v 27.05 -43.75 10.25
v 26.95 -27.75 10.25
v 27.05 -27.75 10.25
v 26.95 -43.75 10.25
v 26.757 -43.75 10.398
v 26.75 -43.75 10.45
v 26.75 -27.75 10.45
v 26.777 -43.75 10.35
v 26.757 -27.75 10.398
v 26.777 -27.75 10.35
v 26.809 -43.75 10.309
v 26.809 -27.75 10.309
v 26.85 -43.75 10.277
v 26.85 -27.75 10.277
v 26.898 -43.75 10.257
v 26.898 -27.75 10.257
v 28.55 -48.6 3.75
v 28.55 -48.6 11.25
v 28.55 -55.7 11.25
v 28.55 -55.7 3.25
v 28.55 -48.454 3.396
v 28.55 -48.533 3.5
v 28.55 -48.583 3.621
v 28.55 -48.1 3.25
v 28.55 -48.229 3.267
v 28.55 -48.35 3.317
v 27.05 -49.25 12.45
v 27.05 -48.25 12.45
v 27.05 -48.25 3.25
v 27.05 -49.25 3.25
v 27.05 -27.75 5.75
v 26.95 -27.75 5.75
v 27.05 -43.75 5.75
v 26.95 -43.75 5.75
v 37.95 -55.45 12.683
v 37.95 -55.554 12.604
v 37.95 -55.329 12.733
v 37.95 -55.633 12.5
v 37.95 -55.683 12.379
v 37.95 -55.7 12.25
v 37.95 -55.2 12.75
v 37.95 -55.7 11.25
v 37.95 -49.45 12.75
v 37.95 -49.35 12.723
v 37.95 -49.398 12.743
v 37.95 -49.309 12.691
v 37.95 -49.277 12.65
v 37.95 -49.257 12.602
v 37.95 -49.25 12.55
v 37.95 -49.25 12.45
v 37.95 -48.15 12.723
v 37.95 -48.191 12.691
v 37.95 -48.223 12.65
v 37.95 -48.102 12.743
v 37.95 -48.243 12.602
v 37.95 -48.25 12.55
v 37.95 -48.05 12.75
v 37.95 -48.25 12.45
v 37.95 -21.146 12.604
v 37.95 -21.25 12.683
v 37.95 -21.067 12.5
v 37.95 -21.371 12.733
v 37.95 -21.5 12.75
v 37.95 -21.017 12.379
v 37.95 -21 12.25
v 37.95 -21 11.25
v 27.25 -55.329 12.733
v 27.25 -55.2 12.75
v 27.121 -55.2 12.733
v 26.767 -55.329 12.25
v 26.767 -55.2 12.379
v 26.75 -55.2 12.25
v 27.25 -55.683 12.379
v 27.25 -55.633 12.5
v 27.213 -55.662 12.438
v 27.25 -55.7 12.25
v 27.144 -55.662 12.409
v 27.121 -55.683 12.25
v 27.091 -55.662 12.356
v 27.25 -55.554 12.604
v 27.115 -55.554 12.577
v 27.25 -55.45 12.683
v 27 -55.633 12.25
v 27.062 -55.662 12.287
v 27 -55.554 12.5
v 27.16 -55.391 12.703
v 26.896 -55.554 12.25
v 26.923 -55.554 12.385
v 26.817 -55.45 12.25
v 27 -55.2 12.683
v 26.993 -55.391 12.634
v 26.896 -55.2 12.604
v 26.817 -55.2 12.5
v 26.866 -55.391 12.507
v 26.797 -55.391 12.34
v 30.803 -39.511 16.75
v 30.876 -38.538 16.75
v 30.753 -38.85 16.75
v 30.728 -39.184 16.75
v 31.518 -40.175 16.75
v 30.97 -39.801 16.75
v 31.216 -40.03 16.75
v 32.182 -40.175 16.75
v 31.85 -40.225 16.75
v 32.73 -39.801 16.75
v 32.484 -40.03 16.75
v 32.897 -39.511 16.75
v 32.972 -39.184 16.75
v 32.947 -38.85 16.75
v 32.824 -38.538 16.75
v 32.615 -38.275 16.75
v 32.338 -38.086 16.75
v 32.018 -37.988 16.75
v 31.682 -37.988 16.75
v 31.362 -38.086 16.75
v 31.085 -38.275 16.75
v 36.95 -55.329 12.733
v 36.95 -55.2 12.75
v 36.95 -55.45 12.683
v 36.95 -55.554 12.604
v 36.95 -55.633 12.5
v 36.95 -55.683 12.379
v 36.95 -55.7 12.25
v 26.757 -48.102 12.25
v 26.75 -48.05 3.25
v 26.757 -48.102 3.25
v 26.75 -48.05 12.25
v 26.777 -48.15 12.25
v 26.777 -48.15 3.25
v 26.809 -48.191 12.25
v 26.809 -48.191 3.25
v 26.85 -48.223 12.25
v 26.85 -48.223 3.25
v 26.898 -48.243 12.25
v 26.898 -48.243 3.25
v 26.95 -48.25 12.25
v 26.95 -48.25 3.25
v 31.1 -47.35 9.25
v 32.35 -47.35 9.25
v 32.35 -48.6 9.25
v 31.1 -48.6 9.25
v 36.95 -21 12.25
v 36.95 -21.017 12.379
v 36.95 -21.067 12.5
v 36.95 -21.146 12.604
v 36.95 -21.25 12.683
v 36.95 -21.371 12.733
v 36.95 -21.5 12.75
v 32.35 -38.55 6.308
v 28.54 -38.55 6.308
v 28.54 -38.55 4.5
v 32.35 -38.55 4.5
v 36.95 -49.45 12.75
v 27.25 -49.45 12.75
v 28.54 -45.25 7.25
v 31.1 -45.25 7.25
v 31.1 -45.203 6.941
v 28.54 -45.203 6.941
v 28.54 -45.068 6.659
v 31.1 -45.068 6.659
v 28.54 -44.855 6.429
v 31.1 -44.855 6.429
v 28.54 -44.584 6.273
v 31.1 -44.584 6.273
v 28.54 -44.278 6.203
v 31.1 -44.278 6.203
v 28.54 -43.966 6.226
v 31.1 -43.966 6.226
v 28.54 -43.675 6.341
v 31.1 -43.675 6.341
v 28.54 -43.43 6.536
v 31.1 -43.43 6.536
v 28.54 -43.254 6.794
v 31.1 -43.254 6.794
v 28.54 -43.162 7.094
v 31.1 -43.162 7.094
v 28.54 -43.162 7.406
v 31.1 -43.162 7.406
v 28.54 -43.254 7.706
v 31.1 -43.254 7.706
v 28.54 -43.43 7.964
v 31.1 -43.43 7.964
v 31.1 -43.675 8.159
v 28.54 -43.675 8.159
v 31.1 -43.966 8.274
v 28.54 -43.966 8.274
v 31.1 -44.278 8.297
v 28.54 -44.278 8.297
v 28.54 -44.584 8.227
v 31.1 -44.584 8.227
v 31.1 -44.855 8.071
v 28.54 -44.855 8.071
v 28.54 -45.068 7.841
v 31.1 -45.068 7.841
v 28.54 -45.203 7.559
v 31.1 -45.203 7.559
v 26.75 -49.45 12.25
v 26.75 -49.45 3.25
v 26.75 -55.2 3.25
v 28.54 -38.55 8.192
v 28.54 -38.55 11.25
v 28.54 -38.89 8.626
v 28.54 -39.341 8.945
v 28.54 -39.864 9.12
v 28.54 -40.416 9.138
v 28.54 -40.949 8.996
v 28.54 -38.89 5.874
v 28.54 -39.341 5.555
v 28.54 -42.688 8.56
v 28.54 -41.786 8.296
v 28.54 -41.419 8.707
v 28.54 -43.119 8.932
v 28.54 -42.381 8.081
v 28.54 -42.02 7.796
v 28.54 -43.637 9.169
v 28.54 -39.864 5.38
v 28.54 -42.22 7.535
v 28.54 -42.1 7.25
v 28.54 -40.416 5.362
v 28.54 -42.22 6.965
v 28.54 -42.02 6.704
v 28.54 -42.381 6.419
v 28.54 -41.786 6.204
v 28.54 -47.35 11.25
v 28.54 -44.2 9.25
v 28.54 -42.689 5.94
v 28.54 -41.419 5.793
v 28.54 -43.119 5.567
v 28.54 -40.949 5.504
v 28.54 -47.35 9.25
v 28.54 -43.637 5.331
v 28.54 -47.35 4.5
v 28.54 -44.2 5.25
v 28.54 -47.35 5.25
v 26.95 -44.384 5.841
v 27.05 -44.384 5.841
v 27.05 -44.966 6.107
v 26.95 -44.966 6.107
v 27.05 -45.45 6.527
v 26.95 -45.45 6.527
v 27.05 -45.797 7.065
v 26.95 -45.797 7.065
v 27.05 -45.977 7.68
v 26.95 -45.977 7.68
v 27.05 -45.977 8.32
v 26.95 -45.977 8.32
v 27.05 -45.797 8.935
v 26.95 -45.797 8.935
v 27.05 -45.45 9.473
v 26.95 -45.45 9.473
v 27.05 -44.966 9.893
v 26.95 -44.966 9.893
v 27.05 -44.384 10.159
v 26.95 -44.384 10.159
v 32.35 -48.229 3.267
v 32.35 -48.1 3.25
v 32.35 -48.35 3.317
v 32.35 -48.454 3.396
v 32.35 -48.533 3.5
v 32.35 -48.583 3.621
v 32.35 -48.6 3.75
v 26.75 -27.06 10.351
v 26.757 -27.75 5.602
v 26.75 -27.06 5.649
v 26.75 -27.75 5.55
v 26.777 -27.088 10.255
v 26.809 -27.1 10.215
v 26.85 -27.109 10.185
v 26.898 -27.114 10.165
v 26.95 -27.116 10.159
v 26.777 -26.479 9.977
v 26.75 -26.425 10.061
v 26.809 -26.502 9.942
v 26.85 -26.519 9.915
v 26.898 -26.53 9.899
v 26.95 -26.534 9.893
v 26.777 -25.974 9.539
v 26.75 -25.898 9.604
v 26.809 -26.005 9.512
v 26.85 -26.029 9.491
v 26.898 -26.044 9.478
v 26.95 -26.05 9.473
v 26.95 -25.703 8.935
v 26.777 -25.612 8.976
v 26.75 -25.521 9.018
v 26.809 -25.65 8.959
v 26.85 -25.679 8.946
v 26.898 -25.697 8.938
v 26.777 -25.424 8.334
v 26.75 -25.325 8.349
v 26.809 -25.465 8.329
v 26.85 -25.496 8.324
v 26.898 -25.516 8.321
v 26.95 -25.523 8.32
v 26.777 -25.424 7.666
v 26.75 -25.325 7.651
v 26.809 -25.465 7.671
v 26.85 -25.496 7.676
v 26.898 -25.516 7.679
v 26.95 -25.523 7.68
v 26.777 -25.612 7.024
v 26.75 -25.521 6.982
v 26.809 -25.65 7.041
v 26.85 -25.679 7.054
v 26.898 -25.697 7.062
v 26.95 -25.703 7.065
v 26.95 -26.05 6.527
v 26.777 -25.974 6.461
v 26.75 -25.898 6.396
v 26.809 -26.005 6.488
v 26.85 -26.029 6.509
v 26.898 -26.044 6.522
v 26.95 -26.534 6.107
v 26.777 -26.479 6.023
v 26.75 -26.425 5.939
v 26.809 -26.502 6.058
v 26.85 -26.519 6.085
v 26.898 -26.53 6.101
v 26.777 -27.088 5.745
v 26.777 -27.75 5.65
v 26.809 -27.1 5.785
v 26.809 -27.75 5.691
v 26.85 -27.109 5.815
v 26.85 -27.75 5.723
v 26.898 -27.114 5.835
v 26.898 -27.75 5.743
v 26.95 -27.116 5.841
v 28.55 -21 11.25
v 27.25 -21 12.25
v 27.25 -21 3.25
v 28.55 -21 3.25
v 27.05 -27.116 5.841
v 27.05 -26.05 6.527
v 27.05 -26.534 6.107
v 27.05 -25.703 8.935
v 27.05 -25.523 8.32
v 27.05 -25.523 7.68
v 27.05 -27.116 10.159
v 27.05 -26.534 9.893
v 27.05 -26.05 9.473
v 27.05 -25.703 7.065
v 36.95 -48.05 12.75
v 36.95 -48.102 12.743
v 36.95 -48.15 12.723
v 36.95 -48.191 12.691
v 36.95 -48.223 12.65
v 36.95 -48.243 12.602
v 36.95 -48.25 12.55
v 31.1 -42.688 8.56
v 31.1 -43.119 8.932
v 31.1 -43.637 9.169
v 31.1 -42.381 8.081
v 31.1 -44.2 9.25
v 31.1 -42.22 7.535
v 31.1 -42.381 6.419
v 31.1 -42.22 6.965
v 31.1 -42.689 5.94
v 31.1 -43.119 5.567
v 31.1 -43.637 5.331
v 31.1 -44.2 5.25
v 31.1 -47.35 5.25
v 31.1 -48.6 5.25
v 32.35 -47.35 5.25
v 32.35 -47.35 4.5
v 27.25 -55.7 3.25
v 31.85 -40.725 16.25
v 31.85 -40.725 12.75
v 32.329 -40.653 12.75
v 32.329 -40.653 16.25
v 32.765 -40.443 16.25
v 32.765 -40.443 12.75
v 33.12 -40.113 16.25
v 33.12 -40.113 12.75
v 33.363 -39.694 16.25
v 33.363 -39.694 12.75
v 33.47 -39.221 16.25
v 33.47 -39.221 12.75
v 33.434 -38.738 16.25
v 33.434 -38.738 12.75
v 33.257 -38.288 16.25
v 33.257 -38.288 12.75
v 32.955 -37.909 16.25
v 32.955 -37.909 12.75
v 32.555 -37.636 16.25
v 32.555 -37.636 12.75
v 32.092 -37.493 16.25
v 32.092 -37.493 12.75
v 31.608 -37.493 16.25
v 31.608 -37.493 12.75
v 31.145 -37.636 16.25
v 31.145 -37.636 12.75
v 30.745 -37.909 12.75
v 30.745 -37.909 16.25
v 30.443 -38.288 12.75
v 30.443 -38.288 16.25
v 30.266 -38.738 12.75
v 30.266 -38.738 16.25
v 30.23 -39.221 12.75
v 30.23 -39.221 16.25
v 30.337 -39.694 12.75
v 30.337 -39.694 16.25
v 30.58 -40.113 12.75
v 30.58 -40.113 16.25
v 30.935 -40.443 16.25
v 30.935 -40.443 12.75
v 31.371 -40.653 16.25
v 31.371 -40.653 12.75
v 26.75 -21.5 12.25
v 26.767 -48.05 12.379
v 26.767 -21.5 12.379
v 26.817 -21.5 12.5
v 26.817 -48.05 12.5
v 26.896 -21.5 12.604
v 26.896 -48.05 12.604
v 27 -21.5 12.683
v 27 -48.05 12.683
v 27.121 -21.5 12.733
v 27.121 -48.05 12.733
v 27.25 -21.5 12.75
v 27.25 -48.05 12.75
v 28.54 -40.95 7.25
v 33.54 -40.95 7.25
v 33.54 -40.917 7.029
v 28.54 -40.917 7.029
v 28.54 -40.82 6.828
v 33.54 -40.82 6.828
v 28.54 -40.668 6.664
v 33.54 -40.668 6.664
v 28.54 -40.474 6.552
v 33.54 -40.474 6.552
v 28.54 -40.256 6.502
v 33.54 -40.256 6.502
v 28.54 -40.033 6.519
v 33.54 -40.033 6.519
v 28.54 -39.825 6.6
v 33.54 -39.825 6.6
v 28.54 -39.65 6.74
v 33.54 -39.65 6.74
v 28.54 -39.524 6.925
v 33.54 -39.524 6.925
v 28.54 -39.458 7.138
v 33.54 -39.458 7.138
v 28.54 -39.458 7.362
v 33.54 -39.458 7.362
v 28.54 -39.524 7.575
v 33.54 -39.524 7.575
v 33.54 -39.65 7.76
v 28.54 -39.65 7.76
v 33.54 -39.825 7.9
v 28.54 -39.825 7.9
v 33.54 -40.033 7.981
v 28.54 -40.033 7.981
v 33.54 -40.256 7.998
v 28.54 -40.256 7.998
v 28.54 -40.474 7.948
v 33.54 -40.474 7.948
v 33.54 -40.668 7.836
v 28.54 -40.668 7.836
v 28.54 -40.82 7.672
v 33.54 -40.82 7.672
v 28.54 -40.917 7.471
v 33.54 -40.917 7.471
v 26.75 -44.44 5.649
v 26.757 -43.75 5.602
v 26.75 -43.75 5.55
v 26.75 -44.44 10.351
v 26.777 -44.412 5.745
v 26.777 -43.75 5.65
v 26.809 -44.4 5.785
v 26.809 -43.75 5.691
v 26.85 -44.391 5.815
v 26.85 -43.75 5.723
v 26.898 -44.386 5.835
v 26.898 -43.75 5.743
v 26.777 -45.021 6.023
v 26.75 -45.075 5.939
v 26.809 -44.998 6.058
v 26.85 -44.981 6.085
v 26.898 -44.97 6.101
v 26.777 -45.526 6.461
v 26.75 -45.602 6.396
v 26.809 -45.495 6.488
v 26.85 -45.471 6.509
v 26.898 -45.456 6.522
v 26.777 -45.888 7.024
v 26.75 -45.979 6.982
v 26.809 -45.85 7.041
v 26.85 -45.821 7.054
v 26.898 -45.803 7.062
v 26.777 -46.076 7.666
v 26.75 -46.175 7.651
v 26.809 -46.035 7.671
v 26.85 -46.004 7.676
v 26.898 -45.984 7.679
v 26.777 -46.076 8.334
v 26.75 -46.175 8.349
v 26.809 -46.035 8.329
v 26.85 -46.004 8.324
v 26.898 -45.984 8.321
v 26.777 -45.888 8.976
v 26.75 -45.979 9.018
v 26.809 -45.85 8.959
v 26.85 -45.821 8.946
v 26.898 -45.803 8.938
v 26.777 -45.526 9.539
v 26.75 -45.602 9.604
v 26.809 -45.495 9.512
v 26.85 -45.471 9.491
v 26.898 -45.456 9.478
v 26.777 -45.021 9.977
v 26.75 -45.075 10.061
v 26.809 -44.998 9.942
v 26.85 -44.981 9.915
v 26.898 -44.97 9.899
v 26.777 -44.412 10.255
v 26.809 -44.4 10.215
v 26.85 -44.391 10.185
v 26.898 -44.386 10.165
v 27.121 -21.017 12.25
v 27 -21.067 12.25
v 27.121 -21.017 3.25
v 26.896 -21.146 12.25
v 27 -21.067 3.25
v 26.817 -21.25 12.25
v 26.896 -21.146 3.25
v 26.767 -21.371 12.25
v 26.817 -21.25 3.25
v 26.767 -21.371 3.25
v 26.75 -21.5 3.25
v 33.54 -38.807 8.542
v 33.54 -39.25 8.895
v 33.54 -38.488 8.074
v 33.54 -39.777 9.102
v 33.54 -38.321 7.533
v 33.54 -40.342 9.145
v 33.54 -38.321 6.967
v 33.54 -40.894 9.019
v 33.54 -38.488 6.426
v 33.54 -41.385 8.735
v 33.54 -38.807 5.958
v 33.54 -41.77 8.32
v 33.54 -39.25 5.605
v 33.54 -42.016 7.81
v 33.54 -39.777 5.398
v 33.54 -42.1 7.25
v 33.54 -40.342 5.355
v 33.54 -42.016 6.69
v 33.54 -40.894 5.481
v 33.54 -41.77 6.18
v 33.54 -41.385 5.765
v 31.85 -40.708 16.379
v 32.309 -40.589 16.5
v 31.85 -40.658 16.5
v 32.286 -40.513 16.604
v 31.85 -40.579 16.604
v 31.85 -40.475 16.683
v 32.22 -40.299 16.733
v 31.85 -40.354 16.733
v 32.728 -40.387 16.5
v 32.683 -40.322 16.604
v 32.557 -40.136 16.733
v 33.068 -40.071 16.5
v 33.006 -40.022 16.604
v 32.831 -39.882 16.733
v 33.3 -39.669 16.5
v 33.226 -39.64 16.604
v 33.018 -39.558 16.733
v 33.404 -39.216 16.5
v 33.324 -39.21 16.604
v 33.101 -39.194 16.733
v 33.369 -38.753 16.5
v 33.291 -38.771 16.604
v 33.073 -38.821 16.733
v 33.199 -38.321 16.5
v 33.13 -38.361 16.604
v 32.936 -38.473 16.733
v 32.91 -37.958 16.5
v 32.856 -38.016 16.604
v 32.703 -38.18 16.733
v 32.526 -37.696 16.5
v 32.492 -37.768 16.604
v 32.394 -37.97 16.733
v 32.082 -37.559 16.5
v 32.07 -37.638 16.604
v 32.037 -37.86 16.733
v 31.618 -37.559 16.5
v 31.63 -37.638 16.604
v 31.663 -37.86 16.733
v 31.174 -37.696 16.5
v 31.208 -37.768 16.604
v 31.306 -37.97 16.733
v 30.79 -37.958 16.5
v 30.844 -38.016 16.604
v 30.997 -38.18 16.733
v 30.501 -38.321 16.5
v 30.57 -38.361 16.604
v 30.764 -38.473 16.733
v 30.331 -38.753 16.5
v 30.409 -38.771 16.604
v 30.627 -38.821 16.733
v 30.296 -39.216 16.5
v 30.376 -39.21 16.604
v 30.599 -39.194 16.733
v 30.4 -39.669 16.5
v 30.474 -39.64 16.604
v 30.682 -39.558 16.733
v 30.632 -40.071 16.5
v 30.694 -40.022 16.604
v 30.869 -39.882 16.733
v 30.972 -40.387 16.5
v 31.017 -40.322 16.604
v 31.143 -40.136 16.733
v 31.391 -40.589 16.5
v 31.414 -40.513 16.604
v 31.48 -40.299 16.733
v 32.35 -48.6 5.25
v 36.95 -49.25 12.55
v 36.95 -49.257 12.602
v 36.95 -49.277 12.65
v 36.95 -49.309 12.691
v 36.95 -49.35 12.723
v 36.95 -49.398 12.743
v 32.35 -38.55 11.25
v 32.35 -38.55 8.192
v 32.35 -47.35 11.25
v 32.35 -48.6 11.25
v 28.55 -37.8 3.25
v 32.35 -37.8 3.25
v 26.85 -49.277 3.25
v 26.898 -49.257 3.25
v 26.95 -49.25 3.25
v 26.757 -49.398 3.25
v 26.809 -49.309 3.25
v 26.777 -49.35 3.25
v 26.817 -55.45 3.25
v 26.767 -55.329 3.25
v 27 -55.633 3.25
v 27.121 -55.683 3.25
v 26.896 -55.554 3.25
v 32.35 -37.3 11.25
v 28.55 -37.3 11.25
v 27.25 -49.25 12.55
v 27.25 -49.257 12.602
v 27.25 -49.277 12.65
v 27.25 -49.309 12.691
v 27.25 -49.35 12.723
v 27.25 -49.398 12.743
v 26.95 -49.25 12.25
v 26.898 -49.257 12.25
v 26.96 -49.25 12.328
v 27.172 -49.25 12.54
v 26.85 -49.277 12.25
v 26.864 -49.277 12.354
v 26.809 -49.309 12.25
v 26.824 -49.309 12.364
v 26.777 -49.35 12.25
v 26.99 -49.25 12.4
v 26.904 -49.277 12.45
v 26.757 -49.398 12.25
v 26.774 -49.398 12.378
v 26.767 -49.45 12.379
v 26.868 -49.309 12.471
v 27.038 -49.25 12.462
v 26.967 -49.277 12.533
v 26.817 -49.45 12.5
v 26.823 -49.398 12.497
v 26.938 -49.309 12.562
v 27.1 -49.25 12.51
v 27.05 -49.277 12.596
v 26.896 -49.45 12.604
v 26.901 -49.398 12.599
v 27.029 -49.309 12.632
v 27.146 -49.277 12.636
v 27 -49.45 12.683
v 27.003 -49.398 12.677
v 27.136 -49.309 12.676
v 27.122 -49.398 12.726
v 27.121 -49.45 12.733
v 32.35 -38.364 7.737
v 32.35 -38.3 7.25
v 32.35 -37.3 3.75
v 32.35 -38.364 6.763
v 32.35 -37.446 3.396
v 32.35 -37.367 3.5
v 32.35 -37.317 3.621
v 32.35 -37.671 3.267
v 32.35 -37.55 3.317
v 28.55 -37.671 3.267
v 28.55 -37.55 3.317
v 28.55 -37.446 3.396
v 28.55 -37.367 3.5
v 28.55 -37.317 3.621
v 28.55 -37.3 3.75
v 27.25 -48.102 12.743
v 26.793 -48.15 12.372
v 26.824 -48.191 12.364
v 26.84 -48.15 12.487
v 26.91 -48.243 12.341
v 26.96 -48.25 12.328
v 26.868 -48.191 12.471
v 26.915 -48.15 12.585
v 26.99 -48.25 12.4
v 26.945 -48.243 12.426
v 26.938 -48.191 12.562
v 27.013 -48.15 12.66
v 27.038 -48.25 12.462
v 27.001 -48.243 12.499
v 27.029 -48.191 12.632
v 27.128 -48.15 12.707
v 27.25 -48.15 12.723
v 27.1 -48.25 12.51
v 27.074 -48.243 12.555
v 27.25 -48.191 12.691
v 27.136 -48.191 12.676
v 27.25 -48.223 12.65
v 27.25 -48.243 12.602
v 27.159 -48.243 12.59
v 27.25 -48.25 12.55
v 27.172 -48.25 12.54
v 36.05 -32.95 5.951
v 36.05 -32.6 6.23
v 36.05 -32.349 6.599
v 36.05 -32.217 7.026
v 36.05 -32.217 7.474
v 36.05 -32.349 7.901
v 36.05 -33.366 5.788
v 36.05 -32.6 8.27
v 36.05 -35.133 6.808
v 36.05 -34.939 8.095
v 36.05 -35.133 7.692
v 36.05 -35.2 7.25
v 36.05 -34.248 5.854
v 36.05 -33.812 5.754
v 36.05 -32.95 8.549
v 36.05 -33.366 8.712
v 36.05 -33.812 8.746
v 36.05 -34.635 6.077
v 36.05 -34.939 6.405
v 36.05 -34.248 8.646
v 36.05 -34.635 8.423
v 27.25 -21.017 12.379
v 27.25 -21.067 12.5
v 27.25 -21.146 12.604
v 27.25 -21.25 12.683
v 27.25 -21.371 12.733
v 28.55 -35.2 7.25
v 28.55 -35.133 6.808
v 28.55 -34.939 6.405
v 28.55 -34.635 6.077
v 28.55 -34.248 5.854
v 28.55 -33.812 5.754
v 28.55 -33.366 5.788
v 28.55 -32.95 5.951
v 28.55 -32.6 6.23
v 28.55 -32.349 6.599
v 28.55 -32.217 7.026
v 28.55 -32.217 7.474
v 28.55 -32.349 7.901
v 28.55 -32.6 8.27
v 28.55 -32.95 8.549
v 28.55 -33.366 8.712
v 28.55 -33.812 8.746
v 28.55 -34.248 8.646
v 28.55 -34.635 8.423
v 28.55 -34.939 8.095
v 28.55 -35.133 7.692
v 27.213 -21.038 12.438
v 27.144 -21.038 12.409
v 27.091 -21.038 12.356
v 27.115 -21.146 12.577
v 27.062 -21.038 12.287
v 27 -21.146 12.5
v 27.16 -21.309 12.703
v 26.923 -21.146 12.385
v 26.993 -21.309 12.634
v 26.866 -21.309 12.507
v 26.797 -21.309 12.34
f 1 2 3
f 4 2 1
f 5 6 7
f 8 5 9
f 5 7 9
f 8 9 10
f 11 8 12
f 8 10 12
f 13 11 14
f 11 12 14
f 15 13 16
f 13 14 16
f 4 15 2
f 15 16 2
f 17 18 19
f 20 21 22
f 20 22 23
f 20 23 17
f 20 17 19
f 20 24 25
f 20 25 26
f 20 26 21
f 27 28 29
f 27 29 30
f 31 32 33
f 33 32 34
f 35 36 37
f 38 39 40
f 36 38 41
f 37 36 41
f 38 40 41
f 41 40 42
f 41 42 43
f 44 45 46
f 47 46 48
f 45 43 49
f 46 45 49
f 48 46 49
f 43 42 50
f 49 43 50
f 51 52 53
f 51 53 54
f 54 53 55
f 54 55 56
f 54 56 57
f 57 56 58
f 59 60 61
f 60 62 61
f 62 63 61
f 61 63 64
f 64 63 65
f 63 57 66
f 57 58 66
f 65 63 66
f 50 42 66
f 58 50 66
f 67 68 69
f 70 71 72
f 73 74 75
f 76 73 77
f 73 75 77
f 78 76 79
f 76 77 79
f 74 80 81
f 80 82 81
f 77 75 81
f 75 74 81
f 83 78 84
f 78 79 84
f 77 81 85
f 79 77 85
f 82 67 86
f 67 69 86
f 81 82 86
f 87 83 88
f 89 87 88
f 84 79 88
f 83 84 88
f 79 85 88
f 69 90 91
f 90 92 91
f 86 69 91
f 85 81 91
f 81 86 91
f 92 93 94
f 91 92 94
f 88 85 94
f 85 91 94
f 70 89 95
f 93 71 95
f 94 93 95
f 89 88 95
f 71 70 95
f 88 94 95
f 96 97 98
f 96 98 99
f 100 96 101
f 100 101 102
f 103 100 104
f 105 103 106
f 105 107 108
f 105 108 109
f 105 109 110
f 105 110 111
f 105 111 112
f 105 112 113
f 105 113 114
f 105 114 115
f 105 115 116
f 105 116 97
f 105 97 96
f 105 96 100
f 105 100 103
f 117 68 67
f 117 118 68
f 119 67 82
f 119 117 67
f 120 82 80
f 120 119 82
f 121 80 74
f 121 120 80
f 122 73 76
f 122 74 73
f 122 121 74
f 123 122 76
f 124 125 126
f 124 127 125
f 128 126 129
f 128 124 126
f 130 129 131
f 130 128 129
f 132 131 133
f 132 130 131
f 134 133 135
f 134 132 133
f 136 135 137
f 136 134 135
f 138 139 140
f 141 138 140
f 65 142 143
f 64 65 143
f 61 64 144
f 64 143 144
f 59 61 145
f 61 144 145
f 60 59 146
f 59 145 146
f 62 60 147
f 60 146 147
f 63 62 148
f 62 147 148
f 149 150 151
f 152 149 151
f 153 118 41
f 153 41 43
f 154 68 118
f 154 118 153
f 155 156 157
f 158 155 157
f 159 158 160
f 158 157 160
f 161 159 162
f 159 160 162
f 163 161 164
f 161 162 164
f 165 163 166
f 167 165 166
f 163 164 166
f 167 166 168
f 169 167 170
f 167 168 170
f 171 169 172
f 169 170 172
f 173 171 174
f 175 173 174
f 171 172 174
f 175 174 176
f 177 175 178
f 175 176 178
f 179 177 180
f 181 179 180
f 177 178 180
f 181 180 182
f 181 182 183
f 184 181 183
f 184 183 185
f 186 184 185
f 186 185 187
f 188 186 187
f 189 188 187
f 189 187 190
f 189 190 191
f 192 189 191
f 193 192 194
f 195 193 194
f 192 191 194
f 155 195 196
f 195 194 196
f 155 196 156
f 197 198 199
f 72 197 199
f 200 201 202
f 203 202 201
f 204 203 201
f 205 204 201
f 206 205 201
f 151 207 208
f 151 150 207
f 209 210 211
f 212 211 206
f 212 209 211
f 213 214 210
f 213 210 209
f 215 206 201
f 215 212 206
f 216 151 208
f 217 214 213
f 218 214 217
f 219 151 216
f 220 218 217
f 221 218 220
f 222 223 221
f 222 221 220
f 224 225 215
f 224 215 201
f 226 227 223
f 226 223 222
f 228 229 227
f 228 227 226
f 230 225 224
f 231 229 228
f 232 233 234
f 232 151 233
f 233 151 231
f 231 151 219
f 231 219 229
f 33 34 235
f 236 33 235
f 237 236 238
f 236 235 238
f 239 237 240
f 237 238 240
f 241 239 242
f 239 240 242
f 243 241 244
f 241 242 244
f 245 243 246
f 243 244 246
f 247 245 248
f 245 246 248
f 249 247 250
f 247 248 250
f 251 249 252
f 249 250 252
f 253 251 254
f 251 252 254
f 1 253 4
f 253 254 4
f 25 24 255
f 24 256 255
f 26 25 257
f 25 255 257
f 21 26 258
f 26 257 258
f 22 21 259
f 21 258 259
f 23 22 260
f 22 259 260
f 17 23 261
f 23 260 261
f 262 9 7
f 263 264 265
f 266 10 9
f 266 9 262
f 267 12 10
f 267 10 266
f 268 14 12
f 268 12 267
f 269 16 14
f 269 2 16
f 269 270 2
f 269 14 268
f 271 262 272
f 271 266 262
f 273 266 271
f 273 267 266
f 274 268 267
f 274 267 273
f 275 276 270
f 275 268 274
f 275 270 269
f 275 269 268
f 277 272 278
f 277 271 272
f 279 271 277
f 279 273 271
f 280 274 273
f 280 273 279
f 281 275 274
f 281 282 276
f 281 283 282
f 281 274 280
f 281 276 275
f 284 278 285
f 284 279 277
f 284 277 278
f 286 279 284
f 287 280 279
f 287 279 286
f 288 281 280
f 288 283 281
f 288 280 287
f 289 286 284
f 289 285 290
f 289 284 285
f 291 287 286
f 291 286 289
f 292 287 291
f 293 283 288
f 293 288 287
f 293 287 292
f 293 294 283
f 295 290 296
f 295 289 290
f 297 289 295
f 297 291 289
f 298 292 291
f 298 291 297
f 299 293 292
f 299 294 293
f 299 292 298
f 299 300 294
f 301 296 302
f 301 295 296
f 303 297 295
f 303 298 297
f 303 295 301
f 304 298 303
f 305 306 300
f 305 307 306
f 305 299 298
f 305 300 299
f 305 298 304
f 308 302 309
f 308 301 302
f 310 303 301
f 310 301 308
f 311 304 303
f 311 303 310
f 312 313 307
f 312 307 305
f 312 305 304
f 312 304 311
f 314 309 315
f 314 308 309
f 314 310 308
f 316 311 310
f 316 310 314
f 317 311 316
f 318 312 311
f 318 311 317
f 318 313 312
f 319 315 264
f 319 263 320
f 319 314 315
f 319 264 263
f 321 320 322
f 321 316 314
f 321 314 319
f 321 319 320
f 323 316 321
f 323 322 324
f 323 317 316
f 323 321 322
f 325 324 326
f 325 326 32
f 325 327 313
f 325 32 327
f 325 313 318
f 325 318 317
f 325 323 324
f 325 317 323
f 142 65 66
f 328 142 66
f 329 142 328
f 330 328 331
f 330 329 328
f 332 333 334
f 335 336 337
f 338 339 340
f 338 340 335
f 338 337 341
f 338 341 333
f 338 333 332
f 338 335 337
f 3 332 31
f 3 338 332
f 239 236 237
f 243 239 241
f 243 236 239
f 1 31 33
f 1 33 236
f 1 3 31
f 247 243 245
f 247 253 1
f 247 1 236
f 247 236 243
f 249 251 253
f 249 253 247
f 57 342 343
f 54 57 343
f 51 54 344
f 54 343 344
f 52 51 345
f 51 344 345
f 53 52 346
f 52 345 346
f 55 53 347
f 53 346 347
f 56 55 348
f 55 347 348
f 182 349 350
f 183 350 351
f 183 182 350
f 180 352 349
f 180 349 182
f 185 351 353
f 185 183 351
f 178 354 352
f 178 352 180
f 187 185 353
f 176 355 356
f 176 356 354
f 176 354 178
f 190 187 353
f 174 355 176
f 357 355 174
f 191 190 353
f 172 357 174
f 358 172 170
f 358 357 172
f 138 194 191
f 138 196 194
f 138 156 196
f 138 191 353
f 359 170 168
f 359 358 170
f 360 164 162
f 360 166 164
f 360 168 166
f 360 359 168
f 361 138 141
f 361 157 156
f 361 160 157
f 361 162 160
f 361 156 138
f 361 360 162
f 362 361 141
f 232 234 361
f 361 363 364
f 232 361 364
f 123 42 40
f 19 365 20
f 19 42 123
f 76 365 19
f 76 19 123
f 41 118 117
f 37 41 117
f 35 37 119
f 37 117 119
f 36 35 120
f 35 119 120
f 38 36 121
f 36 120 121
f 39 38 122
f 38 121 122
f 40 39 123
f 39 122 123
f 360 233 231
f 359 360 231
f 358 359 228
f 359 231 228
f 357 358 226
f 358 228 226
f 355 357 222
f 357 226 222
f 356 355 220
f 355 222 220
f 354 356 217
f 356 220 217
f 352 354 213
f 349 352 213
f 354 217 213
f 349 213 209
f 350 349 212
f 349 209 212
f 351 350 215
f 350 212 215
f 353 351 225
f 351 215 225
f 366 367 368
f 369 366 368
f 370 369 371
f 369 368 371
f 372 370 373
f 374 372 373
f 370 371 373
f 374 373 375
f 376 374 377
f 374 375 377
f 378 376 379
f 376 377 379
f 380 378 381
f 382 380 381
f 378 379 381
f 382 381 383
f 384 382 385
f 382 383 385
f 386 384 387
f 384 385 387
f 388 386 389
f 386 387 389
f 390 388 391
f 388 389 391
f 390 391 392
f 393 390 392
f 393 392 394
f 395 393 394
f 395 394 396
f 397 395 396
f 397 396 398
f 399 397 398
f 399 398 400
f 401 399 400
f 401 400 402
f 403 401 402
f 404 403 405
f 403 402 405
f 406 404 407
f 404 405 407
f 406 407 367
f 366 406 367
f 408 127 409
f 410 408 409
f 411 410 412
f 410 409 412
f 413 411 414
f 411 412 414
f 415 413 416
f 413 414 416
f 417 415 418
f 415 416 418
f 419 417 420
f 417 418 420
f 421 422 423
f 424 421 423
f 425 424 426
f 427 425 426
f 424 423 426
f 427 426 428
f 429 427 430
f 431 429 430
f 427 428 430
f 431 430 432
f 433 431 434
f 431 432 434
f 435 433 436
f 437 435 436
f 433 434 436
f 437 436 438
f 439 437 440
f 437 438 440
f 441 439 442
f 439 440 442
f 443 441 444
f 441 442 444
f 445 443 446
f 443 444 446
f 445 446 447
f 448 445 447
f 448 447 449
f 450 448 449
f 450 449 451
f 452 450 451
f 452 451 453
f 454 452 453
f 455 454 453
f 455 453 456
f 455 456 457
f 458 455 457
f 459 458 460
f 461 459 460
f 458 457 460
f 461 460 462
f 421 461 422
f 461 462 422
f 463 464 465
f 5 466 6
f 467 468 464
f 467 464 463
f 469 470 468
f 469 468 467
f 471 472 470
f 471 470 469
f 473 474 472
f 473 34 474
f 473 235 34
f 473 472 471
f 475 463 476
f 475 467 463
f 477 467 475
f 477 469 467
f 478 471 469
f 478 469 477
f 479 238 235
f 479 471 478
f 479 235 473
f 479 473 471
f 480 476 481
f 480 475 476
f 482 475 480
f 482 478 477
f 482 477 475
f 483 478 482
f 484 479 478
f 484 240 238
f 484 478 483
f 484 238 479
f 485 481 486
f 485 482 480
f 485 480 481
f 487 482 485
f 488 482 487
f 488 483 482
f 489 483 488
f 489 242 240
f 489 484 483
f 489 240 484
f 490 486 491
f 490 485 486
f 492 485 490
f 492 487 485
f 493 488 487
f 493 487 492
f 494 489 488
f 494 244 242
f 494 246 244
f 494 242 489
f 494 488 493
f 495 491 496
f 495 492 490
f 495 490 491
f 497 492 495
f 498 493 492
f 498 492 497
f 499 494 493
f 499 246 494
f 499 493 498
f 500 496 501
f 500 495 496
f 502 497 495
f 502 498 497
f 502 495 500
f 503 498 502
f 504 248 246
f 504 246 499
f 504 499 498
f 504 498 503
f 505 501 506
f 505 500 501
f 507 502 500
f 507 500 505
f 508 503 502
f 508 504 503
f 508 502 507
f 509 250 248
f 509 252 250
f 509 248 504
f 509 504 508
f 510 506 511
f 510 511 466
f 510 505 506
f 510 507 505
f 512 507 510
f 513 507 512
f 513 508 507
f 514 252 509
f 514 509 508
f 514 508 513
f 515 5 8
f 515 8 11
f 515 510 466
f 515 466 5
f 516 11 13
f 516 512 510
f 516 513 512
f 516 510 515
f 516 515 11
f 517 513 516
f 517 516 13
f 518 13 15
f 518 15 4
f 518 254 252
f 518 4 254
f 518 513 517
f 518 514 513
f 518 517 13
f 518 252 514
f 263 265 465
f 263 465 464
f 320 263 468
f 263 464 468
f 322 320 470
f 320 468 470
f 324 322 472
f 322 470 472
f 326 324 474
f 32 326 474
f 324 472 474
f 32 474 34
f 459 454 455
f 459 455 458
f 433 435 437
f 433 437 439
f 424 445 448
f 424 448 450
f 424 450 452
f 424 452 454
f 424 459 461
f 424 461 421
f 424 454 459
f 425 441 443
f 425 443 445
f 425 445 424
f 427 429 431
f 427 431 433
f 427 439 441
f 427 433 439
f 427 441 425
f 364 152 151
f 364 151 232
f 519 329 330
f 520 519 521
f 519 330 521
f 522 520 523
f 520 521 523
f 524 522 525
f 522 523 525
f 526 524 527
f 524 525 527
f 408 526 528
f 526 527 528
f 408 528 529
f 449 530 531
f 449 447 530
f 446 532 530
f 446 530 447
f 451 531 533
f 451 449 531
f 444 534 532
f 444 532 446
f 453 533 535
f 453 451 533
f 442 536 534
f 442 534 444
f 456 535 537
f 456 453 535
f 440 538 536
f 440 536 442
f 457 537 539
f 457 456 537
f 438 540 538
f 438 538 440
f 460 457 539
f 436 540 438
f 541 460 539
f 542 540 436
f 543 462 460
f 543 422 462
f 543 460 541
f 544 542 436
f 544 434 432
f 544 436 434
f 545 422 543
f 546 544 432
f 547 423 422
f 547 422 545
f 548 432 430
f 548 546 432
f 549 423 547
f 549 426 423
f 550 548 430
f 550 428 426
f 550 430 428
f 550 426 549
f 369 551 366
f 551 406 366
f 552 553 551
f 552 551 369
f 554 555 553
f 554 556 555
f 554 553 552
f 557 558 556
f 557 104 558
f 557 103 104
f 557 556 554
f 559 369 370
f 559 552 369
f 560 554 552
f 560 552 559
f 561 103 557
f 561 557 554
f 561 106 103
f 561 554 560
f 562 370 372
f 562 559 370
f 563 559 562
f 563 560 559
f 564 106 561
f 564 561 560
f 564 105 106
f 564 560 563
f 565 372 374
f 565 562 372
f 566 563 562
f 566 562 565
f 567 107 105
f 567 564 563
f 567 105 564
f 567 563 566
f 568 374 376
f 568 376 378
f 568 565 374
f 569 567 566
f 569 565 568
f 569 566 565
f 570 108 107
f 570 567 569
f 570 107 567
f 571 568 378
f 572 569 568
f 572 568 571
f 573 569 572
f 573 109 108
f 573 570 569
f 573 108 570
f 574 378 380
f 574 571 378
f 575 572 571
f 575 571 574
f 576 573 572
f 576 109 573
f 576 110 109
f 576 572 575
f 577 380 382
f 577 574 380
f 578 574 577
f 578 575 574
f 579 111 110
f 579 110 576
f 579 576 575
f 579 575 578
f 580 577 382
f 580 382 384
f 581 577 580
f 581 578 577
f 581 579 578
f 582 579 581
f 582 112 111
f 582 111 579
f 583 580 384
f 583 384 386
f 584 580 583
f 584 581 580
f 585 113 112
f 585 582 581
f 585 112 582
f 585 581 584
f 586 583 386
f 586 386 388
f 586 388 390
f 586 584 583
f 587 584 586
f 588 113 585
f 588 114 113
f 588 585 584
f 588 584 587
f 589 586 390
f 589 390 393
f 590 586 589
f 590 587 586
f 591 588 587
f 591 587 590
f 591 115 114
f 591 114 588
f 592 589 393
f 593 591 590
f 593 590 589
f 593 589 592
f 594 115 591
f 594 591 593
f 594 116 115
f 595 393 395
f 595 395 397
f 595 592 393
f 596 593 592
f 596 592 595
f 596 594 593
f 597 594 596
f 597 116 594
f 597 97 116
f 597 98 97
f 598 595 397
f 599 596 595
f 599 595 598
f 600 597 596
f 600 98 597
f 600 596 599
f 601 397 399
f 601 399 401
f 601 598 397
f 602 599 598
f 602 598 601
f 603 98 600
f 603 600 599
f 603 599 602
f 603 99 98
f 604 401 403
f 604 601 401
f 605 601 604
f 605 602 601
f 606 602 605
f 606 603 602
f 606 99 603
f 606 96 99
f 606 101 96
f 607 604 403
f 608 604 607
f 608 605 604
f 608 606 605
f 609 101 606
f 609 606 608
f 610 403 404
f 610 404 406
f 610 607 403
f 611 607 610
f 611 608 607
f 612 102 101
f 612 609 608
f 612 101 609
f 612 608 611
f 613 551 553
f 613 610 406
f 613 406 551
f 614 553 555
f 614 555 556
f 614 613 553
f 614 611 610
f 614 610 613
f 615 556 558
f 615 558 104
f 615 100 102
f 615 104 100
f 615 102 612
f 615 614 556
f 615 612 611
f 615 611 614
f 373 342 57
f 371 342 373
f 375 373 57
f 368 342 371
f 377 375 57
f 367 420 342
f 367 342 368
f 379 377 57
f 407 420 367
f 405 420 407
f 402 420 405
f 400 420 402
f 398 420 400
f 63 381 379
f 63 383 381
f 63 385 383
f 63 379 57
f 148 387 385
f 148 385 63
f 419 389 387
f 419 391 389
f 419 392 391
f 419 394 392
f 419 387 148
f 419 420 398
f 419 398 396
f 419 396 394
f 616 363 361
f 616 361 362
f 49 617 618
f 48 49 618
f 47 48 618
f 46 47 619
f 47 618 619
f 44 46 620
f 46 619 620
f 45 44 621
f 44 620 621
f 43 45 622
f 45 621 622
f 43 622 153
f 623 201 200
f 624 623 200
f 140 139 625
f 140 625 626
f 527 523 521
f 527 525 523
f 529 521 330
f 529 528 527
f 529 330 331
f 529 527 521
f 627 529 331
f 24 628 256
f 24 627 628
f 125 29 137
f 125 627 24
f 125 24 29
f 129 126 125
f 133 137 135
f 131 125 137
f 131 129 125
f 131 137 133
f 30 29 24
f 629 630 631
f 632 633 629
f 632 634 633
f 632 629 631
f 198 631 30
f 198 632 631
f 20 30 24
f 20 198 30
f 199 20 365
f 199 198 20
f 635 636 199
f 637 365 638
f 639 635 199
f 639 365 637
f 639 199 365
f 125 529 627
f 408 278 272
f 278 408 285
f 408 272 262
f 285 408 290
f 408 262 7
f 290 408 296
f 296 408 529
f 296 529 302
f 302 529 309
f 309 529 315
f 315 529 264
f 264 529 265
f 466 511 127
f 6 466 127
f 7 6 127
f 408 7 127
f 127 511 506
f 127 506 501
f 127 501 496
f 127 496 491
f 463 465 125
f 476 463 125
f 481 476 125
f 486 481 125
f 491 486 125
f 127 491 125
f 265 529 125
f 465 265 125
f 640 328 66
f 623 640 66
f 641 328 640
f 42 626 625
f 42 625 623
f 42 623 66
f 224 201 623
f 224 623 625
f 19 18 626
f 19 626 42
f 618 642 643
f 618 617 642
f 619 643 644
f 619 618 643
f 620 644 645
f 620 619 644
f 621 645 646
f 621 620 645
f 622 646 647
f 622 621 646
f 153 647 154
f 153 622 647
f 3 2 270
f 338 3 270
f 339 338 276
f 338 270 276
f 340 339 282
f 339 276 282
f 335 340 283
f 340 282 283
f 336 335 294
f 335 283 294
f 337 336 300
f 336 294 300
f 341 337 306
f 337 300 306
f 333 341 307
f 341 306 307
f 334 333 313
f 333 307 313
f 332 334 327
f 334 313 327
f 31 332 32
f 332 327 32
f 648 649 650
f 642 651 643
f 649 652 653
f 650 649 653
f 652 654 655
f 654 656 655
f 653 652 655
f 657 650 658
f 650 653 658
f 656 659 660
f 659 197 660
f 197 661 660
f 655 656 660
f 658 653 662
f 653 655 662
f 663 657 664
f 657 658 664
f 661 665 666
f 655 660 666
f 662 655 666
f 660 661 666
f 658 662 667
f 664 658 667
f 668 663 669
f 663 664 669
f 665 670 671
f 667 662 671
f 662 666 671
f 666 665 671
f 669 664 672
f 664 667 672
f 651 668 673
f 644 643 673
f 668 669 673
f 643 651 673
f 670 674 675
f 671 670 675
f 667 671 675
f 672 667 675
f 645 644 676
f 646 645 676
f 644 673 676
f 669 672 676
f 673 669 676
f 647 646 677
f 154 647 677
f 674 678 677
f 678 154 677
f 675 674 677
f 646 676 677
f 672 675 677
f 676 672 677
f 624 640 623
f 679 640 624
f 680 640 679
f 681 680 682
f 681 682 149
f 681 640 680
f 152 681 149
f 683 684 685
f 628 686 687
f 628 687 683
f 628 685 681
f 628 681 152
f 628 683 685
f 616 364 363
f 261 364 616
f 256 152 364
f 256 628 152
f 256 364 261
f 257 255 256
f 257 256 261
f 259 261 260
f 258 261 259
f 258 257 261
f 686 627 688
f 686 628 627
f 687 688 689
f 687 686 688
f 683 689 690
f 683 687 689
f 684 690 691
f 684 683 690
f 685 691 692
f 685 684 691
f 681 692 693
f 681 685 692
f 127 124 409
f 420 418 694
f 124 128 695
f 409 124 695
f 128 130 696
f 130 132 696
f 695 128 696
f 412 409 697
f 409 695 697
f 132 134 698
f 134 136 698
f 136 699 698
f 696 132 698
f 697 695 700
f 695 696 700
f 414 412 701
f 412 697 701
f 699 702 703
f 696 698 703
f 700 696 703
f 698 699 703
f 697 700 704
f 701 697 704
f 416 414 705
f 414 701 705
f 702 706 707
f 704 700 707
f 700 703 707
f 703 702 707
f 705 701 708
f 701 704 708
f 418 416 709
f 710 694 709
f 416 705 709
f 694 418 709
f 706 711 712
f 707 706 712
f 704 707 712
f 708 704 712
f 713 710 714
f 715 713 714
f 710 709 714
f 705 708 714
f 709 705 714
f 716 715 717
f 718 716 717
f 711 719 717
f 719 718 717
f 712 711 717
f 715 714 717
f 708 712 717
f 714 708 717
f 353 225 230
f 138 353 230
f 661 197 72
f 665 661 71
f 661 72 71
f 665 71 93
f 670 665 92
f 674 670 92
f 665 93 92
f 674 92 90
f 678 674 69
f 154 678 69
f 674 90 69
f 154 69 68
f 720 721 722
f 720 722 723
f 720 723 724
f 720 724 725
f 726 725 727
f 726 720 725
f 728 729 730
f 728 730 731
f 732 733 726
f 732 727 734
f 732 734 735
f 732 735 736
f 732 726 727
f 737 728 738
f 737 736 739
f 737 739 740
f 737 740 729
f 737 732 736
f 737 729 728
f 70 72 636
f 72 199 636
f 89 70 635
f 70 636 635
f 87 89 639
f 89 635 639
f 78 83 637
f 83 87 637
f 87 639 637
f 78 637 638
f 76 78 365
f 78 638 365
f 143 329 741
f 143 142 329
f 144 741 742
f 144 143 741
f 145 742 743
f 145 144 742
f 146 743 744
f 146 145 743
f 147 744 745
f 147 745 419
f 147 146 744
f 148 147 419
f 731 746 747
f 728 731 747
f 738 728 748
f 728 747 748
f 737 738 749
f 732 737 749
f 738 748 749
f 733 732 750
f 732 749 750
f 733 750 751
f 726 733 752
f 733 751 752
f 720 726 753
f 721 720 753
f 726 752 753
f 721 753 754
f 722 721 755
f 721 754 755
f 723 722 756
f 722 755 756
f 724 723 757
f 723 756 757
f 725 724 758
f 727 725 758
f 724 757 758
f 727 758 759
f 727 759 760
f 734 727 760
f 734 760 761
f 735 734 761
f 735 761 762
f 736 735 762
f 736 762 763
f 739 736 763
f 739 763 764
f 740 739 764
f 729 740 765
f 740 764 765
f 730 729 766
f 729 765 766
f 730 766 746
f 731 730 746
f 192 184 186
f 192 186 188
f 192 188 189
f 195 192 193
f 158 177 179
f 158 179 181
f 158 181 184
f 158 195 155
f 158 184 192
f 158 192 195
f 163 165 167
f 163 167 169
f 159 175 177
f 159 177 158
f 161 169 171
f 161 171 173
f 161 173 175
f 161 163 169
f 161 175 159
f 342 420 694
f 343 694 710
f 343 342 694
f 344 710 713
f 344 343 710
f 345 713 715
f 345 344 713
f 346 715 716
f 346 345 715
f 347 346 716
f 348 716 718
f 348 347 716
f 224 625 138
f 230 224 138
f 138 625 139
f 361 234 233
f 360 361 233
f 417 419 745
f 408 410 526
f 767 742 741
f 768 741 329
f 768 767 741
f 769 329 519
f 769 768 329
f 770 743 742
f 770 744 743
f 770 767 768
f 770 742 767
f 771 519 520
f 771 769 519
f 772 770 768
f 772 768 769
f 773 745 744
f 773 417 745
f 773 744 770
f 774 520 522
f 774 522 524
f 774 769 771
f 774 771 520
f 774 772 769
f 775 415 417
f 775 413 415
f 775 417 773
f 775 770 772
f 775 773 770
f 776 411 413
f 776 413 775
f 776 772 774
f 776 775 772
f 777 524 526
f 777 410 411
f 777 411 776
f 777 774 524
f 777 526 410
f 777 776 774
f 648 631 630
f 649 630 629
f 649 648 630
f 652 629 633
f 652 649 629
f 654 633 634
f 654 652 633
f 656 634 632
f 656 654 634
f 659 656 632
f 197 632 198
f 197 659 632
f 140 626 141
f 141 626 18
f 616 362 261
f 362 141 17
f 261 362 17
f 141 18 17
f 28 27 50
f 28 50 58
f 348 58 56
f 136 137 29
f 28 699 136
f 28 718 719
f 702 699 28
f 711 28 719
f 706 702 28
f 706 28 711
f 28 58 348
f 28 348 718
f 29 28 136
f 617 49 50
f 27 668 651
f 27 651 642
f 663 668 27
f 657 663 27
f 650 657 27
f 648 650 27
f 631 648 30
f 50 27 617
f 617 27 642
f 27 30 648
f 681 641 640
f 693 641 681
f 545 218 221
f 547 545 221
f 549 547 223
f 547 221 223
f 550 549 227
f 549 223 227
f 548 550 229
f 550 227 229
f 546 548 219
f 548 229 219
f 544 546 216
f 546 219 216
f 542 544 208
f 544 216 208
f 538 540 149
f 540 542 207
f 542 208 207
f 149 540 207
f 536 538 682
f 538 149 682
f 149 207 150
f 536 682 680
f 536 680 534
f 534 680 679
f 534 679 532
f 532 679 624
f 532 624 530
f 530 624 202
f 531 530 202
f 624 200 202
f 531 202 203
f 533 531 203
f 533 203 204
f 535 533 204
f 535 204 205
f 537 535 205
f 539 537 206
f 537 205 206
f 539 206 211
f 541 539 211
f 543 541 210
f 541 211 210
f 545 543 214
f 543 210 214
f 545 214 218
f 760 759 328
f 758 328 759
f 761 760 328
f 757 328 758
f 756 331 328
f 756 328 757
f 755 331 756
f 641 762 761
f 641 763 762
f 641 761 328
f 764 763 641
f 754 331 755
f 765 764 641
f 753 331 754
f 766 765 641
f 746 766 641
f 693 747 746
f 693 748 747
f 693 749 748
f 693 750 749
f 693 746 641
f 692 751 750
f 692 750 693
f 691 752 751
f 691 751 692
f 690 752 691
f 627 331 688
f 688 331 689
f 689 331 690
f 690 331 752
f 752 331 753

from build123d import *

# Parameters (mm, degrees)
SKETCH012_W             = 34.7
SKETCH012_H             = 9.5
PAD002_DEPTH            = 10.2
SKETCH013_W             = 34.7
SKETCH013_H             = 8
POCKET010_DEPTH         = 8.4
SKETCH014_W             = 11.3
SKETCH014_H             = 8
PAD003_DEPTH            = 3.8
SKETCH015_R             = 1.5
PAD004_DEPTH            = 7.5
FILLET002_R             = 0.5
SKETCH016_W             = 8.8
SKETCH016_H             = 6.75
POCKET011_DEPTH         = 3.81
SKETCH018_W             = 1.25
SKETCH018_H             = 4
POCKET012_DEPTH         = 1.25
PAD005_DEPTH            = 2.56
SKETCH019_R             = 1.9
PAD006_DEPTH            = 5
SKETCH020_R             = 1.05
POCKET014_DEPTH         = 2.56
SKETCH021_R             = 0.75
POCKET015_DEPTH         = 5
SKETCH022_W             = 1
SKETCH022_H             = 9.5
POCKET016_DEPTH         = 0.3
SKETCH023_W             = 1
SKETCH023_H             = 10.2
POCKET017_DEPTH         = 0.3
FILLET003_R             = 0.2
FILLET004_R             = 0.2
SKETCH036_R             = 1.625
PAD012_DEPTH            = 4
FILLET008_R             = 0.5
FILLET020_R             = 0.5
PAD161_DEPTH            = 1
BODY002_ROLL_ANGLE      = -90
BODY002_PLACEMENT_ANGLE = -90


with BuildPart() as part:
    # Sketch012 → Pad002 (new body)
    with BuildSketch(Plane.XY):
        with Locations((-17.35, 0)):
            Rectangle(SKETCH012_W, SKETCH012_H)
    extrude(amount=PAD002_DEPTH)

    # Sketch013 (on Face6 of Pad002) → Pocket010 (cut)
    with BuildSketch(Plane.XY.offset(10.2)):
        with Locations((-17.35, 0.75)):
            Rectangle(SKETCH013_W, SKETCH013_H)
    extrude(amount=-POCKET010_DEPTH, mode=Mode.SUBTRACT)

    # Sketch014 (on Face6 of Pocket010) → Pad003 (join)
    with BuildSketch(Plane.XY.offset(1.8)):
        with Locations((-12.75, 0.75)):
            Rectangle(SKETCH014_W, SKETCH014_H)
    extrude(amount=PAD003_DEPTH)

    # Sketch015 (on Face6 of Pad003) → Pad004 (join)
    with BuildSketch(Plane.XY.offset(1.8)):
        with Locations((-22, 0.75)):
            Circle(SKETCH015_R)
    extrude(amount=PAD004_DEPTH)

    # Fillet002
    fillet002_edges = [part.edges().sort_by_distance(p)[0] for p in [
        (-17.35, -4.75, 0),
        (-34.7, -4.75, 5.1),
        (-34.7, 0, 0),
        (0, -4.75, 5.1),
        (0, 0, 0),
    ]]
    fillet(fillet002_edges, radius=FILLET002_R)

    # Sketch016 (on Face14 of Fillet002) → Pocket011 (cut)
    with BuildSketch(Plane.XY.offset(5.6)):
        with Locations((-12.75, 0.125)):
            Rectangle(SKETCH016_W, SKETCH016_H)
    extrude(amount=-POCKET011_DEPTH, mode=Mode.SUBTRACT)

    # Sketch018 (on Face13 of Pocket011) → Pocket012 (cut)
    with BuildSketch(Plane.XY.offset(5.6)):
        with Locations((-7.725, 0.75)):
            Rectangle(SKETCH018_W, SKETCH018_H)
    extrude(amount=-POCKET012_DEPTH, mode=Mode.SUBTRACT)

    # Sketch017 (on Face23 of Pocket011) → Pad005 (join)
    with BuildSketch(Plane.XY.offset(1.79)):
        with BuildLine():
            Line((-8.35, 2.75), (-11.5, 2.75))
            ThreePointArc((-11.5, 2.75), (-13.500002, 0.750015), (-11.500029, -1.25))
            Line((-11.500029, -1.25), (-8.35, -1.25))
            Line((-8.35, -1.25), (-8.35, 2.75))
        make_face()
    extrude(amount=PAD005_DEPTH)

    # Sketch019 (on Face16 of Pad005) → Pad006 (join)
    with BuildSketch(Plane.XY.offset(1.79)):
        with Locations((-15.5, 0.75)):
            Circle(SKETCH019_R)
    extrude(amount=PAD006_DEPTH)

    # Sketch020 (on Face26 of Pad006) → Pocket014 (cut)
    with BuildSketch(Plane.XY.offset(4.35)):
        with Locations((-11.5, 0.75)):
            Circle(SKETCH020_R)
    extrude(amount=-POCKET014_DEPTH, mode=Mode.SUBTRACT)

    # Sketch021 (on Face37 of Pocket014) → Pocket015 (cut)
    with BuildSketch(Plane.XY.offset(6.79)):
        with Locations((-15.5, 0.75)):
            Circle(SKETCH021_R)
    extrude(amount=-POCKET015_DEPTH, mode=Mode.SUBTRACT)

    # Sketch022 (on Face20 of Pocket015) → Pocket016 (cut)
    with BuildSketch(Plane(origin=(0, 0, 0), x_dir=(1, 0, 0), z_dir=(0, 0, -1))):
        with BuildLine():
            ThreePointArc((-27.95, 2.25), (-30.2, 0), (-27.95, -2.25))
            Line((-27.95, -2.25), (-11.95, -2.25))
            ThreePointArc((-11.95, -2.25), (-9.7, 0), (-11.95, 2.25))
            Line((-27.95, 2.25), (-11.95, 2.25))
        make_face()
        with Locations((-6.95, 0)):
            Rectangle(SKETCH022_W, SKETCH022_H)
    extrude(amount=-POCKET016_DEPTH, mode=Mode.SUBTRACT)

    # Sketch023 (on Face10 of Pocket016) → Pocket017 (cut)
    with BuildSketch(Plane.XZ.offset(4.75)):
        with Locations((-6.95, 5.1)):
            Rectangle(SKETCH023_W, SKETCH023_H)
    extrude(amount=-POCKET017_DEPTH, mode=Mode.SUBTRACT)

    # Fillet003
    fillet003_edges = [part.edges().sort_by_distance(p)[0] for p in [
        (-9.7, 0, 0),
        (-19.95, 2.25, 0),
        (-19.95, -2.25, 0),
        (-30.2, 0, 0),
    ]]
    fillet(fillet003_edges, radius=FILLET003_R)

    # Fillet004
    fillet004_edges = [part.edges().sort_by_distance(p)[0] for p in [
        (-7.45, 0.25, 0),
        (-6.45, 0.25, 0),
        (-7.45, -4.352155, 0.010547),
        (-7.45, -4.603553, 0.146447),
        (-7.45, -4.739453, 0.397845),
        (-7.45, -4.75, 5.35),
        (-6.45, -4.75, 5.35),
        (-6.45, -4.739453, 0.397845),
        (-6.45, -4.603553, 0.146447),
        (-6.45, -4.352155, 0.010547),
    ]]
    fillet(fillet004_edges, radius=FILLET004_R)

    # Sketch036 (on Face13 of Fillet004) → Pad012 (join)
    with BuildSketch(Plane.XZ.offset(4.75)):
        with Locations((-16.6, 5.1)):
            Circle(SKETCH036_R)
    extrude(amount=PAD012_DEPTH)

    # Fillet008
    fillet008_edges = [part.edges().sort_by_distance(p)[0] for p in [
        (-18.225, -8.75, 5.1),
    ]]
    fillet(fillet008_edges, radius=FILLET008_R)

    # Fillet020
    fillet020_edges = [part.edges().sort_by_distance(p)[0] for p in [
        (-7.1, 4.75, 3.7),
        (-18.4, 4.75, 3.7),
    ]]
    fillet(fillet020_edges, radius=FILLET020_R)

    # Sketch282 (on Face29 of Fillet020) → Pad161 (join)
    with BuildSketch(Plane.XY.offset(10.2)):
        with BuildLine():
            Line((0, -3.25), (0, -4.25))
            ThreePointArc((-0.5, -4.75), (-0.146447, -4.603553), (0, -4.25))
            Line((-0.5, -4.75), (-6.25, -4.75))
            ThreePointArc((-6.45, -4.55), (-6.391421, -4.691421), (-6.25, -4.75))
            Line((-6.45, -4.55), (-6.45, -4.45))
            Line((-6.45, -4.45), (-7.45, -4.45))
            Line((-7.45, -4.45), (-7.45, -4.55))
            ThreePointArc((-7.65, -4.75), (-7.508579, -4.691421), (-7.45, -4.55))
            Line((-7.65, -4.75), (-34.2, -4.75))
            ThreePointArc((-34.7, -4.25), (-34.553553, -4.603553), (-34.2, -4.75))
            Line((-34.7, -4.25), (-34.7, -3.25))
            Line((-34.7, -3.25), (0, -3.25))
        make_face()
    extrude(amount=PAD161_DEPTH)


with BuildPart() as part_1:
    # Body002 roll: moved
    add(part.part.rotate(Axis((0, 0, 0), (1, 0, 0)), BODY002_ROLL_ANGLE))


with BuildPart() as part_2:
    # Body002 placement: moved
    add(part_1.part.moved(Location((26.75, -55.7, 8))).rotate(Axis((26.75, -55.7, 8), (0, 0, 1)), BODY002_PLACEMENT_ANGLE))


solid = part_2.part
